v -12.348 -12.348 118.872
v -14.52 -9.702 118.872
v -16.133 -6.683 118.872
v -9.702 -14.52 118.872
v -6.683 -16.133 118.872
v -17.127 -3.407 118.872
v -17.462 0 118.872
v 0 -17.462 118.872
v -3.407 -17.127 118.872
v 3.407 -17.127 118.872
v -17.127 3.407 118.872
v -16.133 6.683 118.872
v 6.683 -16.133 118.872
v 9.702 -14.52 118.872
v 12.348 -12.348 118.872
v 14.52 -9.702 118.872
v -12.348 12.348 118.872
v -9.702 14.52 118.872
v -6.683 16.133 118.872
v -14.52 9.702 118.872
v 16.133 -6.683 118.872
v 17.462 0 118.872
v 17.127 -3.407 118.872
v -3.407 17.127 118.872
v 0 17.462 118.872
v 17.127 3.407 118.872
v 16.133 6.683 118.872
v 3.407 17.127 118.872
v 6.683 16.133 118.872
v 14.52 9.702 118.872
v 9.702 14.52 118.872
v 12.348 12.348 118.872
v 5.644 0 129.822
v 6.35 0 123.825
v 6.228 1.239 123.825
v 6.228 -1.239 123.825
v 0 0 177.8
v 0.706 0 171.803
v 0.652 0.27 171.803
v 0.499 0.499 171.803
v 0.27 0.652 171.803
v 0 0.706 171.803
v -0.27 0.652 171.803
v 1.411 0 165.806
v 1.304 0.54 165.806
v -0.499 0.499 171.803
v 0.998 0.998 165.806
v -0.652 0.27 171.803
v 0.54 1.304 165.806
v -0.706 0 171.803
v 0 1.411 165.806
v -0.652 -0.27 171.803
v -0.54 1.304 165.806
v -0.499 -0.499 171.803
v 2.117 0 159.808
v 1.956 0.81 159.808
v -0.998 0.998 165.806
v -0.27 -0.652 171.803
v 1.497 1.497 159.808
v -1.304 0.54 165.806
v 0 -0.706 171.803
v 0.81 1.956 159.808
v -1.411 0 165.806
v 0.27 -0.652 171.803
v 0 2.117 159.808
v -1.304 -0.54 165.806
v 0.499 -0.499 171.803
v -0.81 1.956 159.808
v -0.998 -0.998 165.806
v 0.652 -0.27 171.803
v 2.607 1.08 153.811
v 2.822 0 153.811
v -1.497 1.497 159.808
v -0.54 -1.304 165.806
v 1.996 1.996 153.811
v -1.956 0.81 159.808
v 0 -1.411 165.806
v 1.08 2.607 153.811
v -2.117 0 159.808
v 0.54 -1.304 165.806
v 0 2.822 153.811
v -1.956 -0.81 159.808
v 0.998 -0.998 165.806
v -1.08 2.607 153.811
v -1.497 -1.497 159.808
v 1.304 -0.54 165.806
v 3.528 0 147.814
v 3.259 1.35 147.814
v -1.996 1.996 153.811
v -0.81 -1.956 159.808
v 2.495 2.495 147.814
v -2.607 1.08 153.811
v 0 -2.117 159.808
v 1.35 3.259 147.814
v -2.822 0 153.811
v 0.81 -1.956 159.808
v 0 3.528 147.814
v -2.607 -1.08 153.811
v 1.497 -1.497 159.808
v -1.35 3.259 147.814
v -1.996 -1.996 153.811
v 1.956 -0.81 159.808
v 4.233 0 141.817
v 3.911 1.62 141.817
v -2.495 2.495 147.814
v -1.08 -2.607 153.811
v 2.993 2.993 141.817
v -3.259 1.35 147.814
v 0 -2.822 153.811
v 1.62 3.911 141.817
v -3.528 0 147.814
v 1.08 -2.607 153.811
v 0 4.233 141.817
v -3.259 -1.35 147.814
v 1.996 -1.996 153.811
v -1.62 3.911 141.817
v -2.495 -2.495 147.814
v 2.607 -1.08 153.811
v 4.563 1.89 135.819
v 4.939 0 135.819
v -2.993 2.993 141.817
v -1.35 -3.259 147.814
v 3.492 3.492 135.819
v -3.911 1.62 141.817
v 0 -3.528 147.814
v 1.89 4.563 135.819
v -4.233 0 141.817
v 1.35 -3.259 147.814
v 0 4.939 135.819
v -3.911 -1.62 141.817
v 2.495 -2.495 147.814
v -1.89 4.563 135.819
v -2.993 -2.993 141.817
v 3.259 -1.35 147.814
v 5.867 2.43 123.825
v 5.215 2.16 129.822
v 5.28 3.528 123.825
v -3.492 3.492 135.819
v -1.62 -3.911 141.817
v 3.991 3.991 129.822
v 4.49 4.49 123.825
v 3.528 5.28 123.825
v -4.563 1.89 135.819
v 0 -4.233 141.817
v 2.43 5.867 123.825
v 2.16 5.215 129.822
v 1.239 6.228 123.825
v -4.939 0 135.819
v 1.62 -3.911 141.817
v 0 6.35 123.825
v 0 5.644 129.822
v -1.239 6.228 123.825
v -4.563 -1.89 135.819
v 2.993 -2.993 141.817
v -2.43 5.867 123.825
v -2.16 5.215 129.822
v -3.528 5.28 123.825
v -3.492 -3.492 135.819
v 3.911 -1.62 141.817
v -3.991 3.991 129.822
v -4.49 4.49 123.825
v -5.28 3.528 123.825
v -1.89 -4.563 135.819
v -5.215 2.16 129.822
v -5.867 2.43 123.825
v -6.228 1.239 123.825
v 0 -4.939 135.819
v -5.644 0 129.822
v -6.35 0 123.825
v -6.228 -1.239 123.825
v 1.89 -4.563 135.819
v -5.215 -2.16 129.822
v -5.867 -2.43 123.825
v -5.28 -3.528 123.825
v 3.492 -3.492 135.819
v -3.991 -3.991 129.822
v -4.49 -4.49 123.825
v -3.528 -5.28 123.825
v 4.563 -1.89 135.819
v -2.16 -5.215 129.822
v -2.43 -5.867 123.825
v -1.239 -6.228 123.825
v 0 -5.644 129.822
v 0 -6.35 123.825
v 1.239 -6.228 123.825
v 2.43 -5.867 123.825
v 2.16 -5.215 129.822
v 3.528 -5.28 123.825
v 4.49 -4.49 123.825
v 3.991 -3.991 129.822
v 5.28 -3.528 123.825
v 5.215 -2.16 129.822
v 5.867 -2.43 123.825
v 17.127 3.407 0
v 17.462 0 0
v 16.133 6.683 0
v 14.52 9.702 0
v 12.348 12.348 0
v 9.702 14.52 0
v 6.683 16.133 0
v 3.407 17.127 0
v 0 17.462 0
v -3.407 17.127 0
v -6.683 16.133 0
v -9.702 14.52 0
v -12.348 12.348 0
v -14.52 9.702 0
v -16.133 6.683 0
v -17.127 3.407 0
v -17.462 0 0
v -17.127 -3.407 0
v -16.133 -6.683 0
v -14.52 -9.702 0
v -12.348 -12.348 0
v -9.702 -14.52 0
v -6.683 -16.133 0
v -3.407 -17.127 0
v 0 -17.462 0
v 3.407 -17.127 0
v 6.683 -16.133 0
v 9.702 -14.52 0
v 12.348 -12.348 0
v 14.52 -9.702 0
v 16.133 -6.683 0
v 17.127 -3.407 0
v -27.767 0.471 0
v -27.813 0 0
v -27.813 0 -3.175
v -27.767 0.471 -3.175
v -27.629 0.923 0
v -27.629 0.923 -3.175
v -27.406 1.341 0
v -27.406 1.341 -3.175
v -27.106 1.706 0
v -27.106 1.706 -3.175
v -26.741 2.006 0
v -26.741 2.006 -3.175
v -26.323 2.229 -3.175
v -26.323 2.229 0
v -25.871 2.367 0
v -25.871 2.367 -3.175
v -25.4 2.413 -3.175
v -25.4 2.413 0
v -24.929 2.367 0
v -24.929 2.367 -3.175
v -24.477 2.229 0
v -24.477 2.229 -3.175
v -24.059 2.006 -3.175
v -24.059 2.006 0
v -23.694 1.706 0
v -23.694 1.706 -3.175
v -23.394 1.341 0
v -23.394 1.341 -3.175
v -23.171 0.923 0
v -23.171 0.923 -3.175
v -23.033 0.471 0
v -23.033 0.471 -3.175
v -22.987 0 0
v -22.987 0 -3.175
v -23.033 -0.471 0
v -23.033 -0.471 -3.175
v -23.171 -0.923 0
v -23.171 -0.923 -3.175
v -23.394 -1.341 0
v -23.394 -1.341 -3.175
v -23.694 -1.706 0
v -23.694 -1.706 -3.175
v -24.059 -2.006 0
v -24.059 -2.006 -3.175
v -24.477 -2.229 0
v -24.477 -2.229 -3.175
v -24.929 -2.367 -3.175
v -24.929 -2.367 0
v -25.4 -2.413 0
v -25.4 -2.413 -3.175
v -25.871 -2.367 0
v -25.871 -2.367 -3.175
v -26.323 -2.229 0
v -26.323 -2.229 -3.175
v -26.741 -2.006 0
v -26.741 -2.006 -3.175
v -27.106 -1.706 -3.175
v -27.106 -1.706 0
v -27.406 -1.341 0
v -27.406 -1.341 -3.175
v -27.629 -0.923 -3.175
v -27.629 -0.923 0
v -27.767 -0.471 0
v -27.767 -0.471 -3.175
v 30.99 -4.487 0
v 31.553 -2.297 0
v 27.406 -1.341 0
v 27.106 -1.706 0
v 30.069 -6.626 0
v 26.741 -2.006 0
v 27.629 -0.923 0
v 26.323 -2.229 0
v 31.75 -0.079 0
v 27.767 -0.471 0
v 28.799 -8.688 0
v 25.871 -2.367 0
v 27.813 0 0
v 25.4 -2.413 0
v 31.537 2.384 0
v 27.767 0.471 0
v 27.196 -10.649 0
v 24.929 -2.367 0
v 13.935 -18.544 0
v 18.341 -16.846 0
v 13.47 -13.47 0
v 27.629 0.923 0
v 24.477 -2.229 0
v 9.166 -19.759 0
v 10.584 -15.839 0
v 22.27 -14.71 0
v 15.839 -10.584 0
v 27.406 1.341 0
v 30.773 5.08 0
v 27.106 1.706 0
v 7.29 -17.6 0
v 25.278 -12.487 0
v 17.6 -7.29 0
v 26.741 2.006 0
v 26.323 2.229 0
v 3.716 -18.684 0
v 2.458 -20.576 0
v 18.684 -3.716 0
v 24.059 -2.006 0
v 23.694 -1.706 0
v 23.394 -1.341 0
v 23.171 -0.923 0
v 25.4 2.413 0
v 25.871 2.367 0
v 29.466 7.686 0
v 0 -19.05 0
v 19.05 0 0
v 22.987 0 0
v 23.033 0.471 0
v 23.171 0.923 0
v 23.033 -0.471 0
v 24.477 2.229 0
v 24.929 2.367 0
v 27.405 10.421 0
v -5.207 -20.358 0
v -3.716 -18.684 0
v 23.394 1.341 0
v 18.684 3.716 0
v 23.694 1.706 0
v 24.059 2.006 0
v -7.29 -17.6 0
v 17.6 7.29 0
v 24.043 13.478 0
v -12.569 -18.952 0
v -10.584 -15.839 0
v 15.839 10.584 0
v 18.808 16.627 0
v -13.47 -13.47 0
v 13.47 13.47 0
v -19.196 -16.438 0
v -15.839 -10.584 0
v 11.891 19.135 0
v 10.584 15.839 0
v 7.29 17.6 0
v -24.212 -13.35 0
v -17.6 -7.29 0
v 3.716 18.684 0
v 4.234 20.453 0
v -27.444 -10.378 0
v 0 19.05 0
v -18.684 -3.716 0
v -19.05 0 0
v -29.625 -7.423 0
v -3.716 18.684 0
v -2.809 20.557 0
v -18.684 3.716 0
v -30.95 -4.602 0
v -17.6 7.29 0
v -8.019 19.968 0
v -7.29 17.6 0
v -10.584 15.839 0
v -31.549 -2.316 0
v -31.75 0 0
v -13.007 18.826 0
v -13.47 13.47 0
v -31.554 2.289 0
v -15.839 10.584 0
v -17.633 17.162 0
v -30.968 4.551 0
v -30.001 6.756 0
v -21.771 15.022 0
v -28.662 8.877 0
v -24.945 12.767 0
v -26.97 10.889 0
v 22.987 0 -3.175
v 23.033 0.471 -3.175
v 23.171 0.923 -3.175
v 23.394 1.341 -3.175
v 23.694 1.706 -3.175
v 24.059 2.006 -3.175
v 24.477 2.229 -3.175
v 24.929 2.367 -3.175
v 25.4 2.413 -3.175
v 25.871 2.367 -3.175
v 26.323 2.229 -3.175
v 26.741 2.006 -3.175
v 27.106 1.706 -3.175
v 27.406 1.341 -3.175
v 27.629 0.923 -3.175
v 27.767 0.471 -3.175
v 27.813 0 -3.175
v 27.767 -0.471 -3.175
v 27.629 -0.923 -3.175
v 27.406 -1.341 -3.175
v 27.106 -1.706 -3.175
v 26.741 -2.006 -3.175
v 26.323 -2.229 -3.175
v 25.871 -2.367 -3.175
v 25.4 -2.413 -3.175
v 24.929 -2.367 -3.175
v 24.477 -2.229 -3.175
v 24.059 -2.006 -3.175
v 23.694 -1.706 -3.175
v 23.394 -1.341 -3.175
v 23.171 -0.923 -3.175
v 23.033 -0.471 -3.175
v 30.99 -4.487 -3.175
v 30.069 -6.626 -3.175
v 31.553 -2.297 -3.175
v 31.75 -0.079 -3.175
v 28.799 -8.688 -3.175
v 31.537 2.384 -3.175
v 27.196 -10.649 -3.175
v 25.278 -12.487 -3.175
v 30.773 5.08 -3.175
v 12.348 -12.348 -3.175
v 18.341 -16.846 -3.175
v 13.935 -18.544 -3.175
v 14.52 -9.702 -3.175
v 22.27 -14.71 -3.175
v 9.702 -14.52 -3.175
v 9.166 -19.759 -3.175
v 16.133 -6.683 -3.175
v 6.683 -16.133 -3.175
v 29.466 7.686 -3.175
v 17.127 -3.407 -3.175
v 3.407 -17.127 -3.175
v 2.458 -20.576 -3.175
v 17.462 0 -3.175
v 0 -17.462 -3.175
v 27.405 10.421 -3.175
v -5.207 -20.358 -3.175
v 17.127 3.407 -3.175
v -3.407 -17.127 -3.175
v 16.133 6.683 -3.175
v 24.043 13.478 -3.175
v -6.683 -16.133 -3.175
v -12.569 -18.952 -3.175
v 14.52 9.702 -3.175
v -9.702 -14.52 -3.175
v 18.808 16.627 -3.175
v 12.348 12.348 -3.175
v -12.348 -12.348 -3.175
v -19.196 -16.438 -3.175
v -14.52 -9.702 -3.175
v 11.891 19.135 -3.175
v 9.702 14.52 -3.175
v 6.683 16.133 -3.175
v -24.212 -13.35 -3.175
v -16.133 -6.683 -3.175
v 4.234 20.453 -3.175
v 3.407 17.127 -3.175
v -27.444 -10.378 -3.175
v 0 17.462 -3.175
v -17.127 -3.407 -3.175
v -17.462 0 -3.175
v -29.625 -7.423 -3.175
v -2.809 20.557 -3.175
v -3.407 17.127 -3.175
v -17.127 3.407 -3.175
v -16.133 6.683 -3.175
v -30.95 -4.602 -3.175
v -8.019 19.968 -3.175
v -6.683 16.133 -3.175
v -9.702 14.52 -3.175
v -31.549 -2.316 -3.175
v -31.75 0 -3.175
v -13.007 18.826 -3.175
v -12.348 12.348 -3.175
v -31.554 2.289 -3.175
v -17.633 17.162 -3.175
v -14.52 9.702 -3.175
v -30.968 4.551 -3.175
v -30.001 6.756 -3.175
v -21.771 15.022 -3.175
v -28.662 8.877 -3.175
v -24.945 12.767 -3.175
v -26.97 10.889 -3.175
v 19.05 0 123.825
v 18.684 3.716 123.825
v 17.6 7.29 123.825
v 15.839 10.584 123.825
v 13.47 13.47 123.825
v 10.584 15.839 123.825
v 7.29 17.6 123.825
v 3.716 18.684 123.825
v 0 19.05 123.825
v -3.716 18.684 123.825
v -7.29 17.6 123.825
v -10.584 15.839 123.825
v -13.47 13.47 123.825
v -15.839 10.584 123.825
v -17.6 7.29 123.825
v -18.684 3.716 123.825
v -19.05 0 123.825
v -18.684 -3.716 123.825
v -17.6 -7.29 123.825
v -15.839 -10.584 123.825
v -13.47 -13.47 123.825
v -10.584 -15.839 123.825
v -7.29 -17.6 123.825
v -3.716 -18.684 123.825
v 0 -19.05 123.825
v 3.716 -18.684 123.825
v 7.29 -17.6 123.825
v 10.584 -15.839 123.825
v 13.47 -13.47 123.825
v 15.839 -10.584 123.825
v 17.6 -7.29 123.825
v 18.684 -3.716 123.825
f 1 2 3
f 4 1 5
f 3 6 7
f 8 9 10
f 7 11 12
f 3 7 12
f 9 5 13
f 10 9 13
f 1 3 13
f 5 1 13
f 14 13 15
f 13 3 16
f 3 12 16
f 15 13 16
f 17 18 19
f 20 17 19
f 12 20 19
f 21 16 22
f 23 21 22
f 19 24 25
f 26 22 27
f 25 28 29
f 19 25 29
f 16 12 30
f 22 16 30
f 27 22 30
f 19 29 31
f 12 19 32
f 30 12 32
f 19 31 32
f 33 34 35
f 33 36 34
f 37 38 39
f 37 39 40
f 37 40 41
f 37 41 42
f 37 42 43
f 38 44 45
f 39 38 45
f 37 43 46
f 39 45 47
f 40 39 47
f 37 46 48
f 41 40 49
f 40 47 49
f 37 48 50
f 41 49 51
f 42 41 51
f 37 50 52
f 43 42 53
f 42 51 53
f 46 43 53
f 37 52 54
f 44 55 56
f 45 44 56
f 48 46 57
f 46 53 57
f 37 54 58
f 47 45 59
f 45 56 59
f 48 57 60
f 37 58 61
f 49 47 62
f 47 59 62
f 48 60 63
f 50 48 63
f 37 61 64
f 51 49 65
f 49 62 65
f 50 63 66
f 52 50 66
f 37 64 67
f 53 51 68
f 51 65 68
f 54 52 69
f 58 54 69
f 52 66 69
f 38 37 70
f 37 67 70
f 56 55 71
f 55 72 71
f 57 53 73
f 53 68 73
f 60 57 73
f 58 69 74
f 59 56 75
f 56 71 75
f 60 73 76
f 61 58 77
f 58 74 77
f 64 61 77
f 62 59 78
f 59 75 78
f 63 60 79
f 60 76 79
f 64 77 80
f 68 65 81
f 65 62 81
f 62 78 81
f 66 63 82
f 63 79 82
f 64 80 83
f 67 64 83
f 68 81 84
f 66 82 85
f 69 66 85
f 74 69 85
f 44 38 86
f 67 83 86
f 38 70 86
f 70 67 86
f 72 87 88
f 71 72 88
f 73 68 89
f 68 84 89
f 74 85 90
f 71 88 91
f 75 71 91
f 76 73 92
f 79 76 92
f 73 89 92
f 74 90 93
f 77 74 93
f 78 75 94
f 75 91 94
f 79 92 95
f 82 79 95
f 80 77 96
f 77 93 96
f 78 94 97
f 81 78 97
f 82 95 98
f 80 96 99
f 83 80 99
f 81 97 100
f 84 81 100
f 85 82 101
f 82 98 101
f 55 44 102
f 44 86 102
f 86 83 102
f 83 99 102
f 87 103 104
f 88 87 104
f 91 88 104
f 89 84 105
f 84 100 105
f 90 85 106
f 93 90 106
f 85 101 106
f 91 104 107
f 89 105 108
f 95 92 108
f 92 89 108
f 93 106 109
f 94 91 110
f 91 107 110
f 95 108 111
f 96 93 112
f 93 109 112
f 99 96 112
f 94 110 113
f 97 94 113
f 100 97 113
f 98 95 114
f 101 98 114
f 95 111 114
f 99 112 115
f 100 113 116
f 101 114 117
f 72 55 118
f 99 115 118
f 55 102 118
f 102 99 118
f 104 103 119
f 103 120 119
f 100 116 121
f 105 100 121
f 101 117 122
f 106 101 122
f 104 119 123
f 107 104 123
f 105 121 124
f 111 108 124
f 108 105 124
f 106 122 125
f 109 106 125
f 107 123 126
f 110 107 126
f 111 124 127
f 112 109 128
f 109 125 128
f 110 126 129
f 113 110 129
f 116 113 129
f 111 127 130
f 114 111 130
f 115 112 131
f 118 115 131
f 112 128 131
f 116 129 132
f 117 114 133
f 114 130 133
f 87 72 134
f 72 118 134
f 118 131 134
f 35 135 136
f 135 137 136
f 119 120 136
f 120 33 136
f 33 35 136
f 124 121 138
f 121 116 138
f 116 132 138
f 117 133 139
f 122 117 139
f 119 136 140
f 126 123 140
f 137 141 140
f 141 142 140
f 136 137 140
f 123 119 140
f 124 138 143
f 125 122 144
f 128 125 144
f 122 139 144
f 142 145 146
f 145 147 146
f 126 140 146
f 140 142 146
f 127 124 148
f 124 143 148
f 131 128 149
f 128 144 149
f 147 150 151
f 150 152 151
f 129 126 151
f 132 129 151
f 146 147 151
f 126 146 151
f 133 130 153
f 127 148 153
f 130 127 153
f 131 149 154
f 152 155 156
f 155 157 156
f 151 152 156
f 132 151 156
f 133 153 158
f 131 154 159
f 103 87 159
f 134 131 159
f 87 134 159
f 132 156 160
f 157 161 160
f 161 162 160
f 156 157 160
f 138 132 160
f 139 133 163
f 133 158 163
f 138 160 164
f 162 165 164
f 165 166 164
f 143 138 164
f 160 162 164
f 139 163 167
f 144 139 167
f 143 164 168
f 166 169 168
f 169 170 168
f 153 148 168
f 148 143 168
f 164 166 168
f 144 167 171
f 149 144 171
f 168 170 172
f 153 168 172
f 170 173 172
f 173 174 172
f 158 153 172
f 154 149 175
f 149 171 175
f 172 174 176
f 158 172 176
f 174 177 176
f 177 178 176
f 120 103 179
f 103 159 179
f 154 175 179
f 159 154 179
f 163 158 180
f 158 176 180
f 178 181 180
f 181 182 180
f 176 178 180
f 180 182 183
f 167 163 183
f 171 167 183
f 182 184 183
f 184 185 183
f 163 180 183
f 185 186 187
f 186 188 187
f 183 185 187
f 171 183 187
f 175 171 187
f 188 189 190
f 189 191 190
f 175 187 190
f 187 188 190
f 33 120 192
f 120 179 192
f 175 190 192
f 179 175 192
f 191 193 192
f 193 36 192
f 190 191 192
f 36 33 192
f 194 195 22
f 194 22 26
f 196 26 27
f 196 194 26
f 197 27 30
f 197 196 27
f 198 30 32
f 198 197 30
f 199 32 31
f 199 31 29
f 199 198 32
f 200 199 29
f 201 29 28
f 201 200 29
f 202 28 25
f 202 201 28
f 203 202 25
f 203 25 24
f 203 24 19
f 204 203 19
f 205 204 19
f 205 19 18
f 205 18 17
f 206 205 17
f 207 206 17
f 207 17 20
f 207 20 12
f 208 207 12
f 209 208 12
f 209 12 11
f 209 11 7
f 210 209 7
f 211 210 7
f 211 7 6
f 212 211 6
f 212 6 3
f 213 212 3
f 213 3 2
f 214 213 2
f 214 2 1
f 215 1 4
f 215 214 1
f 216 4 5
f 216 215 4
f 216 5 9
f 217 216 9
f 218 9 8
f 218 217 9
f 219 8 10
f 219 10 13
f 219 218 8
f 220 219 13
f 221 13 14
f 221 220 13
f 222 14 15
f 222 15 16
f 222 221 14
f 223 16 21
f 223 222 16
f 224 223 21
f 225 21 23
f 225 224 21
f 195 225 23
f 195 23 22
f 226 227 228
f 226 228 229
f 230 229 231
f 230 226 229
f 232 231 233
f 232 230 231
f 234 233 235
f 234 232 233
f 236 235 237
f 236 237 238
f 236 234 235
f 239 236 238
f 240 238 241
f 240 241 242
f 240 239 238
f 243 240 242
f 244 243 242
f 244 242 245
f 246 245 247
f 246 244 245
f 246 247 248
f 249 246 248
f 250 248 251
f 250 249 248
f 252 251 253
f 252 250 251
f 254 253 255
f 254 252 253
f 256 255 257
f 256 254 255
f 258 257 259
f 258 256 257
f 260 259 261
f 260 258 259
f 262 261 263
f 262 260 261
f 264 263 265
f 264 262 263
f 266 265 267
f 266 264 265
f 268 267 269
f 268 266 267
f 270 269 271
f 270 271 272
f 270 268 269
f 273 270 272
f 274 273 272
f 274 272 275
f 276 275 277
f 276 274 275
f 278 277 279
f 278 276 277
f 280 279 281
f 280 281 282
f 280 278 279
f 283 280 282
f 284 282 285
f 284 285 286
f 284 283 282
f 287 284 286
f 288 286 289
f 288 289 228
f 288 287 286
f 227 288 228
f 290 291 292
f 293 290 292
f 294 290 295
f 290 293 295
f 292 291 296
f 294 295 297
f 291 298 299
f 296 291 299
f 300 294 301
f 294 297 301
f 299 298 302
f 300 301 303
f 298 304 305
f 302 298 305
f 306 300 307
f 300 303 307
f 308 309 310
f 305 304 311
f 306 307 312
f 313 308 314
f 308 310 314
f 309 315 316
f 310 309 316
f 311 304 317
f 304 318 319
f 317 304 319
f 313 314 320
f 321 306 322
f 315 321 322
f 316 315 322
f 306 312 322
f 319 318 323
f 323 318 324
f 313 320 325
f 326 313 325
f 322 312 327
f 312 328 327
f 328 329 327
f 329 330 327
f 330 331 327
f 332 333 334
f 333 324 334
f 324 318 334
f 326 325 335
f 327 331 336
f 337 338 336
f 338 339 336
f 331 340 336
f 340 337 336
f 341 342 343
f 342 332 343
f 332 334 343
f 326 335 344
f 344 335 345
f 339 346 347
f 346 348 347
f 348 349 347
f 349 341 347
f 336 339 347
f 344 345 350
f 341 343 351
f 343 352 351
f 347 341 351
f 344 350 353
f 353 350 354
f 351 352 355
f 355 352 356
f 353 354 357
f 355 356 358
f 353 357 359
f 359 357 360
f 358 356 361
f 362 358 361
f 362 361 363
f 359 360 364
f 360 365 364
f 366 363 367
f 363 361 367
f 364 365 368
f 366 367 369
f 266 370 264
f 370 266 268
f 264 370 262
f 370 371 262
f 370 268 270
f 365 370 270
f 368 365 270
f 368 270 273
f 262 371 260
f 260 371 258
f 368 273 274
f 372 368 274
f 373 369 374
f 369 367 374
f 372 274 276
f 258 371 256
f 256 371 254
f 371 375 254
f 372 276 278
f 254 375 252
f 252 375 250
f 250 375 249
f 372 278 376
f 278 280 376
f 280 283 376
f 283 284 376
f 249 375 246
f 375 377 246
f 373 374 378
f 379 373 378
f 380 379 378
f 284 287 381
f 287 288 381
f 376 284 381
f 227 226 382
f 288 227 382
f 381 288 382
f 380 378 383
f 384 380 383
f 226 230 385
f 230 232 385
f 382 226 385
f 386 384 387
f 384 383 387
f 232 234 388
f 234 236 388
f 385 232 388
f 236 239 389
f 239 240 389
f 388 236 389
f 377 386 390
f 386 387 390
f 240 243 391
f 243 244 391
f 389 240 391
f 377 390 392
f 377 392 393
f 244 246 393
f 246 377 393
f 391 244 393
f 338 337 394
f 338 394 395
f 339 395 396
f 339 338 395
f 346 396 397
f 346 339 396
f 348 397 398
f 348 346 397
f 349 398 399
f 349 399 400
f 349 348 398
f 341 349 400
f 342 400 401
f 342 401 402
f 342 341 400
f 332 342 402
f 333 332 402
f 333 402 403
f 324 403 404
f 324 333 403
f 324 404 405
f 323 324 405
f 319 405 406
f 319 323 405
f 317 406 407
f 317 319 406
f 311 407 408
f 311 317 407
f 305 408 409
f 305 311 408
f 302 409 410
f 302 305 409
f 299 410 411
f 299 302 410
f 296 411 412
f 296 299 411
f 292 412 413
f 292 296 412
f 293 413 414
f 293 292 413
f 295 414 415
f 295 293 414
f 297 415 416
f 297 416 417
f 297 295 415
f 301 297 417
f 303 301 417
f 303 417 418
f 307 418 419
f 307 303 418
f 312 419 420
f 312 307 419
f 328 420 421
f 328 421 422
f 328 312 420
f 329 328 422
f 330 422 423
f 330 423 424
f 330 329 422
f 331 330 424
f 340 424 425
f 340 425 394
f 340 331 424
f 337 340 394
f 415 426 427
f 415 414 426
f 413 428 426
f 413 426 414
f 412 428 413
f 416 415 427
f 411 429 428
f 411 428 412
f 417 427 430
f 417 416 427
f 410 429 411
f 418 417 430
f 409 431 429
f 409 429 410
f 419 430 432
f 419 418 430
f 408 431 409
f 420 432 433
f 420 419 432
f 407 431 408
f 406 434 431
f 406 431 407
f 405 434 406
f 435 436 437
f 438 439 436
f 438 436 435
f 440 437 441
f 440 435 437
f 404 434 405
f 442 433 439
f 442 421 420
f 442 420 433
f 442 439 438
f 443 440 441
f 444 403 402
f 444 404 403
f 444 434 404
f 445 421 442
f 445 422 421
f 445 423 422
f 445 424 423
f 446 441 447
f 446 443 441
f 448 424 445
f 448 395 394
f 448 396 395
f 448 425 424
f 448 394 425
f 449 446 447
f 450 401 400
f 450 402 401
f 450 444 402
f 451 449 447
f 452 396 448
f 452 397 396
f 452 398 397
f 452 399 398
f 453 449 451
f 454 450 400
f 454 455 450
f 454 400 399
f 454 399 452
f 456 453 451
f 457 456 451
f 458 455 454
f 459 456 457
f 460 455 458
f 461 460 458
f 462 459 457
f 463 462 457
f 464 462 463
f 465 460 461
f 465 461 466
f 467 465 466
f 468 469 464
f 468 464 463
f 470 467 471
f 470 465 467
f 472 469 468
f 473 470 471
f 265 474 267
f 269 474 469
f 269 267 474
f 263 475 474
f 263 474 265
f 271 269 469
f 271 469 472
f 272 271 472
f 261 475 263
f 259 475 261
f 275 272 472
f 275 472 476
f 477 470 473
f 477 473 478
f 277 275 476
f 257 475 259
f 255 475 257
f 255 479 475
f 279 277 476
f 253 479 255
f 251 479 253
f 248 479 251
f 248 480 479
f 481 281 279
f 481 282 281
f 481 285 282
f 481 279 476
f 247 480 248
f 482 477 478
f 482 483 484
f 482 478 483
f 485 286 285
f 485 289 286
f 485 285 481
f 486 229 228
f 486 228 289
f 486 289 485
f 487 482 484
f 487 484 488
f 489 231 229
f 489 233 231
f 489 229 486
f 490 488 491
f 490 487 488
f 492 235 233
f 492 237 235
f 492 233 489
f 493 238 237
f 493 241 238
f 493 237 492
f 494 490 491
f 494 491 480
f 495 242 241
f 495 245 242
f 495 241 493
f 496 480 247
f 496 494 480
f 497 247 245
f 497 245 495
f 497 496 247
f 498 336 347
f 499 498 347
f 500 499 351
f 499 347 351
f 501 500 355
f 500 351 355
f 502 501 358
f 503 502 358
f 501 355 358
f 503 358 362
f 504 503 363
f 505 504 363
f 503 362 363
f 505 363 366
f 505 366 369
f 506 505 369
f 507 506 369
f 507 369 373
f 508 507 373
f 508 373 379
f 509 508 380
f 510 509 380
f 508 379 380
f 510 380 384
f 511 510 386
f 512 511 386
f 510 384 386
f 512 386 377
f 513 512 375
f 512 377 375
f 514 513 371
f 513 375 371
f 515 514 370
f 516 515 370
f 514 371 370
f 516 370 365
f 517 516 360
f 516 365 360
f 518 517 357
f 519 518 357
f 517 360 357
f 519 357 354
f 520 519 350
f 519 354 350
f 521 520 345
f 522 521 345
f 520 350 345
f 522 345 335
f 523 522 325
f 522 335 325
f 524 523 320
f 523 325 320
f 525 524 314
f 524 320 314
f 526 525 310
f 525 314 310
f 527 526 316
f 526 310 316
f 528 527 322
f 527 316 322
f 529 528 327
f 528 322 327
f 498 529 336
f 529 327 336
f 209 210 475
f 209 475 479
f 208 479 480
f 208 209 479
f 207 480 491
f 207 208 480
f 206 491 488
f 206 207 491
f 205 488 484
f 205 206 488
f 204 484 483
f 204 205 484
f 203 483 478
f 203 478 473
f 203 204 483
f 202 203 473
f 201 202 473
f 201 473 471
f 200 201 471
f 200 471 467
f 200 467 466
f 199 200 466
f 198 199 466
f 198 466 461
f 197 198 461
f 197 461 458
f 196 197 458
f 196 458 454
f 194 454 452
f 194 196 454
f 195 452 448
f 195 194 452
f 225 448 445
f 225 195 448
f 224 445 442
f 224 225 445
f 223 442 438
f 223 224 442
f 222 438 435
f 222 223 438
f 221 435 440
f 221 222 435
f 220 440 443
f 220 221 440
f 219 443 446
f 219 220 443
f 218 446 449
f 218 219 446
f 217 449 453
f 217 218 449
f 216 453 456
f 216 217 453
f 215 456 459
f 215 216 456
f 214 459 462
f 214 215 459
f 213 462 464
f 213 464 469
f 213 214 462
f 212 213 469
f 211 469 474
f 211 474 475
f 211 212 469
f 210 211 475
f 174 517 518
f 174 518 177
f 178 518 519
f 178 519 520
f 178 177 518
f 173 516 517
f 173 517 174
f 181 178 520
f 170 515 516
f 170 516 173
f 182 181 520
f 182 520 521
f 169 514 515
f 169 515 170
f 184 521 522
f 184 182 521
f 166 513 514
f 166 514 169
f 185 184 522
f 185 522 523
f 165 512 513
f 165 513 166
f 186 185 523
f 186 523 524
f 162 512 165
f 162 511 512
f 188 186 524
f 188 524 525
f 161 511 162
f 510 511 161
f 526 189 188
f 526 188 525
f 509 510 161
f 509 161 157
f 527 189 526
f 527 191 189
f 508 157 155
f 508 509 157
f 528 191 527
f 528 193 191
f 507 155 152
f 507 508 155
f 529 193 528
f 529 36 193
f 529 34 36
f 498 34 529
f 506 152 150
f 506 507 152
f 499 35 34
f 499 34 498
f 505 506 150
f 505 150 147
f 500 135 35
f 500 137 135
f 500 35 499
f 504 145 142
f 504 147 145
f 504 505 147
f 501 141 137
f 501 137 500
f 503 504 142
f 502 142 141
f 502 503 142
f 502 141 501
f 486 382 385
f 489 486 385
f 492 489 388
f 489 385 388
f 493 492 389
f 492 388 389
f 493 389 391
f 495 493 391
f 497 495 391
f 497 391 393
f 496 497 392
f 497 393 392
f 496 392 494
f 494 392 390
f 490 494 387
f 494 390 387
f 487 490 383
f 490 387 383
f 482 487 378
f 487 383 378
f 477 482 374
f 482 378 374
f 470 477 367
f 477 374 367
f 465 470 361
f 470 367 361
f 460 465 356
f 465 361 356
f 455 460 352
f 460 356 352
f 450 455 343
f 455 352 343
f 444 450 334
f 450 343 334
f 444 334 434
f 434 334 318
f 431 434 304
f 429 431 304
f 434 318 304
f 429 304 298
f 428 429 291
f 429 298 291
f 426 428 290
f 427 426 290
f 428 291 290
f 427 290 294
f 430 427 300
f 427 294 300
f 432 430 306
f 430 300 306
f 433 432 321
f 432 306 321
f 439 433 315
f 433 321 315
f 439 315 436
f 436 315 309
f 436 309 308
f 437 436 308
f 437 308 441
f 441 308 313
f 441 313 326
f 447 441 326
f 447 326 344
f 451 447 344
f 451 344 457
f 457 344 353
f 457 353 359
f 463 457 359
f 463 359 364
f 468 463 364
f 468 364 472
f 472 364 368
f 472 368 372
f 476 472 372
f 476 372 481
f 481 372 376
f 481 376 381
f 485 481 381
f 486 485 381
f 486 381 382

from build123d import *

# Parameters (mm, degrees)
SKETCH1_R           = 19.05
SKETCH1_R_2         = 17.4625
BOSS_EXTRUDE1_DEPTH = 123.825
SKETCH2_RX          = 31.75
SKETCH2_RY          = 20.6375
SKETCH2_R           = 17.4625
SKETCH2_R_2         = 2.413
BOSS_EXTRUDE2_DEPTH = 3.175
SKETCH3_R           = 17.4625
BOSS_EXTRUDE3_DEPTH = 4.953


with BuildPart() as part:
    # Sketch1 → Boss-Extrude1 (new body)
    with BuildSketch(Plane.XY):
        Circle(SKETCH1_R)
        Circle(SKETCH1_R_2, mode=Mode.SUBTRACT)
    extrude(amount=BOSS_EXTRUDE1_DEPTH)

    # Sketch2 → Boss-Extrude2 (add)
    with BuildSketch(Plane(origin=(0, 0, 0), x_dir=(-1, 0, 0), z_dir=(0, 0, -1))):
        with Locations((0, 0)):
            Ellipse(SKETCH2_RX, SKETCH2_RY)
        Circle(SKETCH2_R, mode=Mode.SUBTRACT)
        with Locations((25.4, 0)):
            Circle(SKETCH2_R_2, mode=Mode.SUBTRACT)
        with Locations((-25.4, 0)):
            Circle(SKETCH2_R_2, mode=Mode.SUBTRACT)
    extrude(amount=BOSS_EXTRUDE2_DEPTH)

    # Sketch3 → Boss-Extrude3 (add)
    with BuildSketch(Plane.XY.offset(123.825)):
        Circle(SKETCH3_R)
    extrude(amount=-BOSS_EXTRUDE3_DEPTH)

    # Sketch4 → Revolve1 (revolve)
    with BuildSketch(Plane(origin=(0, 0, 0), x_dir=(1, 0, 0), z_dir=(0, 1, 0))):
        Polygon((0, -123.825), (0, -177.8), (6.35, -123.825), align=None)
    revolve(axis=Axis((0, 0, 123.825), (0, 0, 1)))


solid = part.part
